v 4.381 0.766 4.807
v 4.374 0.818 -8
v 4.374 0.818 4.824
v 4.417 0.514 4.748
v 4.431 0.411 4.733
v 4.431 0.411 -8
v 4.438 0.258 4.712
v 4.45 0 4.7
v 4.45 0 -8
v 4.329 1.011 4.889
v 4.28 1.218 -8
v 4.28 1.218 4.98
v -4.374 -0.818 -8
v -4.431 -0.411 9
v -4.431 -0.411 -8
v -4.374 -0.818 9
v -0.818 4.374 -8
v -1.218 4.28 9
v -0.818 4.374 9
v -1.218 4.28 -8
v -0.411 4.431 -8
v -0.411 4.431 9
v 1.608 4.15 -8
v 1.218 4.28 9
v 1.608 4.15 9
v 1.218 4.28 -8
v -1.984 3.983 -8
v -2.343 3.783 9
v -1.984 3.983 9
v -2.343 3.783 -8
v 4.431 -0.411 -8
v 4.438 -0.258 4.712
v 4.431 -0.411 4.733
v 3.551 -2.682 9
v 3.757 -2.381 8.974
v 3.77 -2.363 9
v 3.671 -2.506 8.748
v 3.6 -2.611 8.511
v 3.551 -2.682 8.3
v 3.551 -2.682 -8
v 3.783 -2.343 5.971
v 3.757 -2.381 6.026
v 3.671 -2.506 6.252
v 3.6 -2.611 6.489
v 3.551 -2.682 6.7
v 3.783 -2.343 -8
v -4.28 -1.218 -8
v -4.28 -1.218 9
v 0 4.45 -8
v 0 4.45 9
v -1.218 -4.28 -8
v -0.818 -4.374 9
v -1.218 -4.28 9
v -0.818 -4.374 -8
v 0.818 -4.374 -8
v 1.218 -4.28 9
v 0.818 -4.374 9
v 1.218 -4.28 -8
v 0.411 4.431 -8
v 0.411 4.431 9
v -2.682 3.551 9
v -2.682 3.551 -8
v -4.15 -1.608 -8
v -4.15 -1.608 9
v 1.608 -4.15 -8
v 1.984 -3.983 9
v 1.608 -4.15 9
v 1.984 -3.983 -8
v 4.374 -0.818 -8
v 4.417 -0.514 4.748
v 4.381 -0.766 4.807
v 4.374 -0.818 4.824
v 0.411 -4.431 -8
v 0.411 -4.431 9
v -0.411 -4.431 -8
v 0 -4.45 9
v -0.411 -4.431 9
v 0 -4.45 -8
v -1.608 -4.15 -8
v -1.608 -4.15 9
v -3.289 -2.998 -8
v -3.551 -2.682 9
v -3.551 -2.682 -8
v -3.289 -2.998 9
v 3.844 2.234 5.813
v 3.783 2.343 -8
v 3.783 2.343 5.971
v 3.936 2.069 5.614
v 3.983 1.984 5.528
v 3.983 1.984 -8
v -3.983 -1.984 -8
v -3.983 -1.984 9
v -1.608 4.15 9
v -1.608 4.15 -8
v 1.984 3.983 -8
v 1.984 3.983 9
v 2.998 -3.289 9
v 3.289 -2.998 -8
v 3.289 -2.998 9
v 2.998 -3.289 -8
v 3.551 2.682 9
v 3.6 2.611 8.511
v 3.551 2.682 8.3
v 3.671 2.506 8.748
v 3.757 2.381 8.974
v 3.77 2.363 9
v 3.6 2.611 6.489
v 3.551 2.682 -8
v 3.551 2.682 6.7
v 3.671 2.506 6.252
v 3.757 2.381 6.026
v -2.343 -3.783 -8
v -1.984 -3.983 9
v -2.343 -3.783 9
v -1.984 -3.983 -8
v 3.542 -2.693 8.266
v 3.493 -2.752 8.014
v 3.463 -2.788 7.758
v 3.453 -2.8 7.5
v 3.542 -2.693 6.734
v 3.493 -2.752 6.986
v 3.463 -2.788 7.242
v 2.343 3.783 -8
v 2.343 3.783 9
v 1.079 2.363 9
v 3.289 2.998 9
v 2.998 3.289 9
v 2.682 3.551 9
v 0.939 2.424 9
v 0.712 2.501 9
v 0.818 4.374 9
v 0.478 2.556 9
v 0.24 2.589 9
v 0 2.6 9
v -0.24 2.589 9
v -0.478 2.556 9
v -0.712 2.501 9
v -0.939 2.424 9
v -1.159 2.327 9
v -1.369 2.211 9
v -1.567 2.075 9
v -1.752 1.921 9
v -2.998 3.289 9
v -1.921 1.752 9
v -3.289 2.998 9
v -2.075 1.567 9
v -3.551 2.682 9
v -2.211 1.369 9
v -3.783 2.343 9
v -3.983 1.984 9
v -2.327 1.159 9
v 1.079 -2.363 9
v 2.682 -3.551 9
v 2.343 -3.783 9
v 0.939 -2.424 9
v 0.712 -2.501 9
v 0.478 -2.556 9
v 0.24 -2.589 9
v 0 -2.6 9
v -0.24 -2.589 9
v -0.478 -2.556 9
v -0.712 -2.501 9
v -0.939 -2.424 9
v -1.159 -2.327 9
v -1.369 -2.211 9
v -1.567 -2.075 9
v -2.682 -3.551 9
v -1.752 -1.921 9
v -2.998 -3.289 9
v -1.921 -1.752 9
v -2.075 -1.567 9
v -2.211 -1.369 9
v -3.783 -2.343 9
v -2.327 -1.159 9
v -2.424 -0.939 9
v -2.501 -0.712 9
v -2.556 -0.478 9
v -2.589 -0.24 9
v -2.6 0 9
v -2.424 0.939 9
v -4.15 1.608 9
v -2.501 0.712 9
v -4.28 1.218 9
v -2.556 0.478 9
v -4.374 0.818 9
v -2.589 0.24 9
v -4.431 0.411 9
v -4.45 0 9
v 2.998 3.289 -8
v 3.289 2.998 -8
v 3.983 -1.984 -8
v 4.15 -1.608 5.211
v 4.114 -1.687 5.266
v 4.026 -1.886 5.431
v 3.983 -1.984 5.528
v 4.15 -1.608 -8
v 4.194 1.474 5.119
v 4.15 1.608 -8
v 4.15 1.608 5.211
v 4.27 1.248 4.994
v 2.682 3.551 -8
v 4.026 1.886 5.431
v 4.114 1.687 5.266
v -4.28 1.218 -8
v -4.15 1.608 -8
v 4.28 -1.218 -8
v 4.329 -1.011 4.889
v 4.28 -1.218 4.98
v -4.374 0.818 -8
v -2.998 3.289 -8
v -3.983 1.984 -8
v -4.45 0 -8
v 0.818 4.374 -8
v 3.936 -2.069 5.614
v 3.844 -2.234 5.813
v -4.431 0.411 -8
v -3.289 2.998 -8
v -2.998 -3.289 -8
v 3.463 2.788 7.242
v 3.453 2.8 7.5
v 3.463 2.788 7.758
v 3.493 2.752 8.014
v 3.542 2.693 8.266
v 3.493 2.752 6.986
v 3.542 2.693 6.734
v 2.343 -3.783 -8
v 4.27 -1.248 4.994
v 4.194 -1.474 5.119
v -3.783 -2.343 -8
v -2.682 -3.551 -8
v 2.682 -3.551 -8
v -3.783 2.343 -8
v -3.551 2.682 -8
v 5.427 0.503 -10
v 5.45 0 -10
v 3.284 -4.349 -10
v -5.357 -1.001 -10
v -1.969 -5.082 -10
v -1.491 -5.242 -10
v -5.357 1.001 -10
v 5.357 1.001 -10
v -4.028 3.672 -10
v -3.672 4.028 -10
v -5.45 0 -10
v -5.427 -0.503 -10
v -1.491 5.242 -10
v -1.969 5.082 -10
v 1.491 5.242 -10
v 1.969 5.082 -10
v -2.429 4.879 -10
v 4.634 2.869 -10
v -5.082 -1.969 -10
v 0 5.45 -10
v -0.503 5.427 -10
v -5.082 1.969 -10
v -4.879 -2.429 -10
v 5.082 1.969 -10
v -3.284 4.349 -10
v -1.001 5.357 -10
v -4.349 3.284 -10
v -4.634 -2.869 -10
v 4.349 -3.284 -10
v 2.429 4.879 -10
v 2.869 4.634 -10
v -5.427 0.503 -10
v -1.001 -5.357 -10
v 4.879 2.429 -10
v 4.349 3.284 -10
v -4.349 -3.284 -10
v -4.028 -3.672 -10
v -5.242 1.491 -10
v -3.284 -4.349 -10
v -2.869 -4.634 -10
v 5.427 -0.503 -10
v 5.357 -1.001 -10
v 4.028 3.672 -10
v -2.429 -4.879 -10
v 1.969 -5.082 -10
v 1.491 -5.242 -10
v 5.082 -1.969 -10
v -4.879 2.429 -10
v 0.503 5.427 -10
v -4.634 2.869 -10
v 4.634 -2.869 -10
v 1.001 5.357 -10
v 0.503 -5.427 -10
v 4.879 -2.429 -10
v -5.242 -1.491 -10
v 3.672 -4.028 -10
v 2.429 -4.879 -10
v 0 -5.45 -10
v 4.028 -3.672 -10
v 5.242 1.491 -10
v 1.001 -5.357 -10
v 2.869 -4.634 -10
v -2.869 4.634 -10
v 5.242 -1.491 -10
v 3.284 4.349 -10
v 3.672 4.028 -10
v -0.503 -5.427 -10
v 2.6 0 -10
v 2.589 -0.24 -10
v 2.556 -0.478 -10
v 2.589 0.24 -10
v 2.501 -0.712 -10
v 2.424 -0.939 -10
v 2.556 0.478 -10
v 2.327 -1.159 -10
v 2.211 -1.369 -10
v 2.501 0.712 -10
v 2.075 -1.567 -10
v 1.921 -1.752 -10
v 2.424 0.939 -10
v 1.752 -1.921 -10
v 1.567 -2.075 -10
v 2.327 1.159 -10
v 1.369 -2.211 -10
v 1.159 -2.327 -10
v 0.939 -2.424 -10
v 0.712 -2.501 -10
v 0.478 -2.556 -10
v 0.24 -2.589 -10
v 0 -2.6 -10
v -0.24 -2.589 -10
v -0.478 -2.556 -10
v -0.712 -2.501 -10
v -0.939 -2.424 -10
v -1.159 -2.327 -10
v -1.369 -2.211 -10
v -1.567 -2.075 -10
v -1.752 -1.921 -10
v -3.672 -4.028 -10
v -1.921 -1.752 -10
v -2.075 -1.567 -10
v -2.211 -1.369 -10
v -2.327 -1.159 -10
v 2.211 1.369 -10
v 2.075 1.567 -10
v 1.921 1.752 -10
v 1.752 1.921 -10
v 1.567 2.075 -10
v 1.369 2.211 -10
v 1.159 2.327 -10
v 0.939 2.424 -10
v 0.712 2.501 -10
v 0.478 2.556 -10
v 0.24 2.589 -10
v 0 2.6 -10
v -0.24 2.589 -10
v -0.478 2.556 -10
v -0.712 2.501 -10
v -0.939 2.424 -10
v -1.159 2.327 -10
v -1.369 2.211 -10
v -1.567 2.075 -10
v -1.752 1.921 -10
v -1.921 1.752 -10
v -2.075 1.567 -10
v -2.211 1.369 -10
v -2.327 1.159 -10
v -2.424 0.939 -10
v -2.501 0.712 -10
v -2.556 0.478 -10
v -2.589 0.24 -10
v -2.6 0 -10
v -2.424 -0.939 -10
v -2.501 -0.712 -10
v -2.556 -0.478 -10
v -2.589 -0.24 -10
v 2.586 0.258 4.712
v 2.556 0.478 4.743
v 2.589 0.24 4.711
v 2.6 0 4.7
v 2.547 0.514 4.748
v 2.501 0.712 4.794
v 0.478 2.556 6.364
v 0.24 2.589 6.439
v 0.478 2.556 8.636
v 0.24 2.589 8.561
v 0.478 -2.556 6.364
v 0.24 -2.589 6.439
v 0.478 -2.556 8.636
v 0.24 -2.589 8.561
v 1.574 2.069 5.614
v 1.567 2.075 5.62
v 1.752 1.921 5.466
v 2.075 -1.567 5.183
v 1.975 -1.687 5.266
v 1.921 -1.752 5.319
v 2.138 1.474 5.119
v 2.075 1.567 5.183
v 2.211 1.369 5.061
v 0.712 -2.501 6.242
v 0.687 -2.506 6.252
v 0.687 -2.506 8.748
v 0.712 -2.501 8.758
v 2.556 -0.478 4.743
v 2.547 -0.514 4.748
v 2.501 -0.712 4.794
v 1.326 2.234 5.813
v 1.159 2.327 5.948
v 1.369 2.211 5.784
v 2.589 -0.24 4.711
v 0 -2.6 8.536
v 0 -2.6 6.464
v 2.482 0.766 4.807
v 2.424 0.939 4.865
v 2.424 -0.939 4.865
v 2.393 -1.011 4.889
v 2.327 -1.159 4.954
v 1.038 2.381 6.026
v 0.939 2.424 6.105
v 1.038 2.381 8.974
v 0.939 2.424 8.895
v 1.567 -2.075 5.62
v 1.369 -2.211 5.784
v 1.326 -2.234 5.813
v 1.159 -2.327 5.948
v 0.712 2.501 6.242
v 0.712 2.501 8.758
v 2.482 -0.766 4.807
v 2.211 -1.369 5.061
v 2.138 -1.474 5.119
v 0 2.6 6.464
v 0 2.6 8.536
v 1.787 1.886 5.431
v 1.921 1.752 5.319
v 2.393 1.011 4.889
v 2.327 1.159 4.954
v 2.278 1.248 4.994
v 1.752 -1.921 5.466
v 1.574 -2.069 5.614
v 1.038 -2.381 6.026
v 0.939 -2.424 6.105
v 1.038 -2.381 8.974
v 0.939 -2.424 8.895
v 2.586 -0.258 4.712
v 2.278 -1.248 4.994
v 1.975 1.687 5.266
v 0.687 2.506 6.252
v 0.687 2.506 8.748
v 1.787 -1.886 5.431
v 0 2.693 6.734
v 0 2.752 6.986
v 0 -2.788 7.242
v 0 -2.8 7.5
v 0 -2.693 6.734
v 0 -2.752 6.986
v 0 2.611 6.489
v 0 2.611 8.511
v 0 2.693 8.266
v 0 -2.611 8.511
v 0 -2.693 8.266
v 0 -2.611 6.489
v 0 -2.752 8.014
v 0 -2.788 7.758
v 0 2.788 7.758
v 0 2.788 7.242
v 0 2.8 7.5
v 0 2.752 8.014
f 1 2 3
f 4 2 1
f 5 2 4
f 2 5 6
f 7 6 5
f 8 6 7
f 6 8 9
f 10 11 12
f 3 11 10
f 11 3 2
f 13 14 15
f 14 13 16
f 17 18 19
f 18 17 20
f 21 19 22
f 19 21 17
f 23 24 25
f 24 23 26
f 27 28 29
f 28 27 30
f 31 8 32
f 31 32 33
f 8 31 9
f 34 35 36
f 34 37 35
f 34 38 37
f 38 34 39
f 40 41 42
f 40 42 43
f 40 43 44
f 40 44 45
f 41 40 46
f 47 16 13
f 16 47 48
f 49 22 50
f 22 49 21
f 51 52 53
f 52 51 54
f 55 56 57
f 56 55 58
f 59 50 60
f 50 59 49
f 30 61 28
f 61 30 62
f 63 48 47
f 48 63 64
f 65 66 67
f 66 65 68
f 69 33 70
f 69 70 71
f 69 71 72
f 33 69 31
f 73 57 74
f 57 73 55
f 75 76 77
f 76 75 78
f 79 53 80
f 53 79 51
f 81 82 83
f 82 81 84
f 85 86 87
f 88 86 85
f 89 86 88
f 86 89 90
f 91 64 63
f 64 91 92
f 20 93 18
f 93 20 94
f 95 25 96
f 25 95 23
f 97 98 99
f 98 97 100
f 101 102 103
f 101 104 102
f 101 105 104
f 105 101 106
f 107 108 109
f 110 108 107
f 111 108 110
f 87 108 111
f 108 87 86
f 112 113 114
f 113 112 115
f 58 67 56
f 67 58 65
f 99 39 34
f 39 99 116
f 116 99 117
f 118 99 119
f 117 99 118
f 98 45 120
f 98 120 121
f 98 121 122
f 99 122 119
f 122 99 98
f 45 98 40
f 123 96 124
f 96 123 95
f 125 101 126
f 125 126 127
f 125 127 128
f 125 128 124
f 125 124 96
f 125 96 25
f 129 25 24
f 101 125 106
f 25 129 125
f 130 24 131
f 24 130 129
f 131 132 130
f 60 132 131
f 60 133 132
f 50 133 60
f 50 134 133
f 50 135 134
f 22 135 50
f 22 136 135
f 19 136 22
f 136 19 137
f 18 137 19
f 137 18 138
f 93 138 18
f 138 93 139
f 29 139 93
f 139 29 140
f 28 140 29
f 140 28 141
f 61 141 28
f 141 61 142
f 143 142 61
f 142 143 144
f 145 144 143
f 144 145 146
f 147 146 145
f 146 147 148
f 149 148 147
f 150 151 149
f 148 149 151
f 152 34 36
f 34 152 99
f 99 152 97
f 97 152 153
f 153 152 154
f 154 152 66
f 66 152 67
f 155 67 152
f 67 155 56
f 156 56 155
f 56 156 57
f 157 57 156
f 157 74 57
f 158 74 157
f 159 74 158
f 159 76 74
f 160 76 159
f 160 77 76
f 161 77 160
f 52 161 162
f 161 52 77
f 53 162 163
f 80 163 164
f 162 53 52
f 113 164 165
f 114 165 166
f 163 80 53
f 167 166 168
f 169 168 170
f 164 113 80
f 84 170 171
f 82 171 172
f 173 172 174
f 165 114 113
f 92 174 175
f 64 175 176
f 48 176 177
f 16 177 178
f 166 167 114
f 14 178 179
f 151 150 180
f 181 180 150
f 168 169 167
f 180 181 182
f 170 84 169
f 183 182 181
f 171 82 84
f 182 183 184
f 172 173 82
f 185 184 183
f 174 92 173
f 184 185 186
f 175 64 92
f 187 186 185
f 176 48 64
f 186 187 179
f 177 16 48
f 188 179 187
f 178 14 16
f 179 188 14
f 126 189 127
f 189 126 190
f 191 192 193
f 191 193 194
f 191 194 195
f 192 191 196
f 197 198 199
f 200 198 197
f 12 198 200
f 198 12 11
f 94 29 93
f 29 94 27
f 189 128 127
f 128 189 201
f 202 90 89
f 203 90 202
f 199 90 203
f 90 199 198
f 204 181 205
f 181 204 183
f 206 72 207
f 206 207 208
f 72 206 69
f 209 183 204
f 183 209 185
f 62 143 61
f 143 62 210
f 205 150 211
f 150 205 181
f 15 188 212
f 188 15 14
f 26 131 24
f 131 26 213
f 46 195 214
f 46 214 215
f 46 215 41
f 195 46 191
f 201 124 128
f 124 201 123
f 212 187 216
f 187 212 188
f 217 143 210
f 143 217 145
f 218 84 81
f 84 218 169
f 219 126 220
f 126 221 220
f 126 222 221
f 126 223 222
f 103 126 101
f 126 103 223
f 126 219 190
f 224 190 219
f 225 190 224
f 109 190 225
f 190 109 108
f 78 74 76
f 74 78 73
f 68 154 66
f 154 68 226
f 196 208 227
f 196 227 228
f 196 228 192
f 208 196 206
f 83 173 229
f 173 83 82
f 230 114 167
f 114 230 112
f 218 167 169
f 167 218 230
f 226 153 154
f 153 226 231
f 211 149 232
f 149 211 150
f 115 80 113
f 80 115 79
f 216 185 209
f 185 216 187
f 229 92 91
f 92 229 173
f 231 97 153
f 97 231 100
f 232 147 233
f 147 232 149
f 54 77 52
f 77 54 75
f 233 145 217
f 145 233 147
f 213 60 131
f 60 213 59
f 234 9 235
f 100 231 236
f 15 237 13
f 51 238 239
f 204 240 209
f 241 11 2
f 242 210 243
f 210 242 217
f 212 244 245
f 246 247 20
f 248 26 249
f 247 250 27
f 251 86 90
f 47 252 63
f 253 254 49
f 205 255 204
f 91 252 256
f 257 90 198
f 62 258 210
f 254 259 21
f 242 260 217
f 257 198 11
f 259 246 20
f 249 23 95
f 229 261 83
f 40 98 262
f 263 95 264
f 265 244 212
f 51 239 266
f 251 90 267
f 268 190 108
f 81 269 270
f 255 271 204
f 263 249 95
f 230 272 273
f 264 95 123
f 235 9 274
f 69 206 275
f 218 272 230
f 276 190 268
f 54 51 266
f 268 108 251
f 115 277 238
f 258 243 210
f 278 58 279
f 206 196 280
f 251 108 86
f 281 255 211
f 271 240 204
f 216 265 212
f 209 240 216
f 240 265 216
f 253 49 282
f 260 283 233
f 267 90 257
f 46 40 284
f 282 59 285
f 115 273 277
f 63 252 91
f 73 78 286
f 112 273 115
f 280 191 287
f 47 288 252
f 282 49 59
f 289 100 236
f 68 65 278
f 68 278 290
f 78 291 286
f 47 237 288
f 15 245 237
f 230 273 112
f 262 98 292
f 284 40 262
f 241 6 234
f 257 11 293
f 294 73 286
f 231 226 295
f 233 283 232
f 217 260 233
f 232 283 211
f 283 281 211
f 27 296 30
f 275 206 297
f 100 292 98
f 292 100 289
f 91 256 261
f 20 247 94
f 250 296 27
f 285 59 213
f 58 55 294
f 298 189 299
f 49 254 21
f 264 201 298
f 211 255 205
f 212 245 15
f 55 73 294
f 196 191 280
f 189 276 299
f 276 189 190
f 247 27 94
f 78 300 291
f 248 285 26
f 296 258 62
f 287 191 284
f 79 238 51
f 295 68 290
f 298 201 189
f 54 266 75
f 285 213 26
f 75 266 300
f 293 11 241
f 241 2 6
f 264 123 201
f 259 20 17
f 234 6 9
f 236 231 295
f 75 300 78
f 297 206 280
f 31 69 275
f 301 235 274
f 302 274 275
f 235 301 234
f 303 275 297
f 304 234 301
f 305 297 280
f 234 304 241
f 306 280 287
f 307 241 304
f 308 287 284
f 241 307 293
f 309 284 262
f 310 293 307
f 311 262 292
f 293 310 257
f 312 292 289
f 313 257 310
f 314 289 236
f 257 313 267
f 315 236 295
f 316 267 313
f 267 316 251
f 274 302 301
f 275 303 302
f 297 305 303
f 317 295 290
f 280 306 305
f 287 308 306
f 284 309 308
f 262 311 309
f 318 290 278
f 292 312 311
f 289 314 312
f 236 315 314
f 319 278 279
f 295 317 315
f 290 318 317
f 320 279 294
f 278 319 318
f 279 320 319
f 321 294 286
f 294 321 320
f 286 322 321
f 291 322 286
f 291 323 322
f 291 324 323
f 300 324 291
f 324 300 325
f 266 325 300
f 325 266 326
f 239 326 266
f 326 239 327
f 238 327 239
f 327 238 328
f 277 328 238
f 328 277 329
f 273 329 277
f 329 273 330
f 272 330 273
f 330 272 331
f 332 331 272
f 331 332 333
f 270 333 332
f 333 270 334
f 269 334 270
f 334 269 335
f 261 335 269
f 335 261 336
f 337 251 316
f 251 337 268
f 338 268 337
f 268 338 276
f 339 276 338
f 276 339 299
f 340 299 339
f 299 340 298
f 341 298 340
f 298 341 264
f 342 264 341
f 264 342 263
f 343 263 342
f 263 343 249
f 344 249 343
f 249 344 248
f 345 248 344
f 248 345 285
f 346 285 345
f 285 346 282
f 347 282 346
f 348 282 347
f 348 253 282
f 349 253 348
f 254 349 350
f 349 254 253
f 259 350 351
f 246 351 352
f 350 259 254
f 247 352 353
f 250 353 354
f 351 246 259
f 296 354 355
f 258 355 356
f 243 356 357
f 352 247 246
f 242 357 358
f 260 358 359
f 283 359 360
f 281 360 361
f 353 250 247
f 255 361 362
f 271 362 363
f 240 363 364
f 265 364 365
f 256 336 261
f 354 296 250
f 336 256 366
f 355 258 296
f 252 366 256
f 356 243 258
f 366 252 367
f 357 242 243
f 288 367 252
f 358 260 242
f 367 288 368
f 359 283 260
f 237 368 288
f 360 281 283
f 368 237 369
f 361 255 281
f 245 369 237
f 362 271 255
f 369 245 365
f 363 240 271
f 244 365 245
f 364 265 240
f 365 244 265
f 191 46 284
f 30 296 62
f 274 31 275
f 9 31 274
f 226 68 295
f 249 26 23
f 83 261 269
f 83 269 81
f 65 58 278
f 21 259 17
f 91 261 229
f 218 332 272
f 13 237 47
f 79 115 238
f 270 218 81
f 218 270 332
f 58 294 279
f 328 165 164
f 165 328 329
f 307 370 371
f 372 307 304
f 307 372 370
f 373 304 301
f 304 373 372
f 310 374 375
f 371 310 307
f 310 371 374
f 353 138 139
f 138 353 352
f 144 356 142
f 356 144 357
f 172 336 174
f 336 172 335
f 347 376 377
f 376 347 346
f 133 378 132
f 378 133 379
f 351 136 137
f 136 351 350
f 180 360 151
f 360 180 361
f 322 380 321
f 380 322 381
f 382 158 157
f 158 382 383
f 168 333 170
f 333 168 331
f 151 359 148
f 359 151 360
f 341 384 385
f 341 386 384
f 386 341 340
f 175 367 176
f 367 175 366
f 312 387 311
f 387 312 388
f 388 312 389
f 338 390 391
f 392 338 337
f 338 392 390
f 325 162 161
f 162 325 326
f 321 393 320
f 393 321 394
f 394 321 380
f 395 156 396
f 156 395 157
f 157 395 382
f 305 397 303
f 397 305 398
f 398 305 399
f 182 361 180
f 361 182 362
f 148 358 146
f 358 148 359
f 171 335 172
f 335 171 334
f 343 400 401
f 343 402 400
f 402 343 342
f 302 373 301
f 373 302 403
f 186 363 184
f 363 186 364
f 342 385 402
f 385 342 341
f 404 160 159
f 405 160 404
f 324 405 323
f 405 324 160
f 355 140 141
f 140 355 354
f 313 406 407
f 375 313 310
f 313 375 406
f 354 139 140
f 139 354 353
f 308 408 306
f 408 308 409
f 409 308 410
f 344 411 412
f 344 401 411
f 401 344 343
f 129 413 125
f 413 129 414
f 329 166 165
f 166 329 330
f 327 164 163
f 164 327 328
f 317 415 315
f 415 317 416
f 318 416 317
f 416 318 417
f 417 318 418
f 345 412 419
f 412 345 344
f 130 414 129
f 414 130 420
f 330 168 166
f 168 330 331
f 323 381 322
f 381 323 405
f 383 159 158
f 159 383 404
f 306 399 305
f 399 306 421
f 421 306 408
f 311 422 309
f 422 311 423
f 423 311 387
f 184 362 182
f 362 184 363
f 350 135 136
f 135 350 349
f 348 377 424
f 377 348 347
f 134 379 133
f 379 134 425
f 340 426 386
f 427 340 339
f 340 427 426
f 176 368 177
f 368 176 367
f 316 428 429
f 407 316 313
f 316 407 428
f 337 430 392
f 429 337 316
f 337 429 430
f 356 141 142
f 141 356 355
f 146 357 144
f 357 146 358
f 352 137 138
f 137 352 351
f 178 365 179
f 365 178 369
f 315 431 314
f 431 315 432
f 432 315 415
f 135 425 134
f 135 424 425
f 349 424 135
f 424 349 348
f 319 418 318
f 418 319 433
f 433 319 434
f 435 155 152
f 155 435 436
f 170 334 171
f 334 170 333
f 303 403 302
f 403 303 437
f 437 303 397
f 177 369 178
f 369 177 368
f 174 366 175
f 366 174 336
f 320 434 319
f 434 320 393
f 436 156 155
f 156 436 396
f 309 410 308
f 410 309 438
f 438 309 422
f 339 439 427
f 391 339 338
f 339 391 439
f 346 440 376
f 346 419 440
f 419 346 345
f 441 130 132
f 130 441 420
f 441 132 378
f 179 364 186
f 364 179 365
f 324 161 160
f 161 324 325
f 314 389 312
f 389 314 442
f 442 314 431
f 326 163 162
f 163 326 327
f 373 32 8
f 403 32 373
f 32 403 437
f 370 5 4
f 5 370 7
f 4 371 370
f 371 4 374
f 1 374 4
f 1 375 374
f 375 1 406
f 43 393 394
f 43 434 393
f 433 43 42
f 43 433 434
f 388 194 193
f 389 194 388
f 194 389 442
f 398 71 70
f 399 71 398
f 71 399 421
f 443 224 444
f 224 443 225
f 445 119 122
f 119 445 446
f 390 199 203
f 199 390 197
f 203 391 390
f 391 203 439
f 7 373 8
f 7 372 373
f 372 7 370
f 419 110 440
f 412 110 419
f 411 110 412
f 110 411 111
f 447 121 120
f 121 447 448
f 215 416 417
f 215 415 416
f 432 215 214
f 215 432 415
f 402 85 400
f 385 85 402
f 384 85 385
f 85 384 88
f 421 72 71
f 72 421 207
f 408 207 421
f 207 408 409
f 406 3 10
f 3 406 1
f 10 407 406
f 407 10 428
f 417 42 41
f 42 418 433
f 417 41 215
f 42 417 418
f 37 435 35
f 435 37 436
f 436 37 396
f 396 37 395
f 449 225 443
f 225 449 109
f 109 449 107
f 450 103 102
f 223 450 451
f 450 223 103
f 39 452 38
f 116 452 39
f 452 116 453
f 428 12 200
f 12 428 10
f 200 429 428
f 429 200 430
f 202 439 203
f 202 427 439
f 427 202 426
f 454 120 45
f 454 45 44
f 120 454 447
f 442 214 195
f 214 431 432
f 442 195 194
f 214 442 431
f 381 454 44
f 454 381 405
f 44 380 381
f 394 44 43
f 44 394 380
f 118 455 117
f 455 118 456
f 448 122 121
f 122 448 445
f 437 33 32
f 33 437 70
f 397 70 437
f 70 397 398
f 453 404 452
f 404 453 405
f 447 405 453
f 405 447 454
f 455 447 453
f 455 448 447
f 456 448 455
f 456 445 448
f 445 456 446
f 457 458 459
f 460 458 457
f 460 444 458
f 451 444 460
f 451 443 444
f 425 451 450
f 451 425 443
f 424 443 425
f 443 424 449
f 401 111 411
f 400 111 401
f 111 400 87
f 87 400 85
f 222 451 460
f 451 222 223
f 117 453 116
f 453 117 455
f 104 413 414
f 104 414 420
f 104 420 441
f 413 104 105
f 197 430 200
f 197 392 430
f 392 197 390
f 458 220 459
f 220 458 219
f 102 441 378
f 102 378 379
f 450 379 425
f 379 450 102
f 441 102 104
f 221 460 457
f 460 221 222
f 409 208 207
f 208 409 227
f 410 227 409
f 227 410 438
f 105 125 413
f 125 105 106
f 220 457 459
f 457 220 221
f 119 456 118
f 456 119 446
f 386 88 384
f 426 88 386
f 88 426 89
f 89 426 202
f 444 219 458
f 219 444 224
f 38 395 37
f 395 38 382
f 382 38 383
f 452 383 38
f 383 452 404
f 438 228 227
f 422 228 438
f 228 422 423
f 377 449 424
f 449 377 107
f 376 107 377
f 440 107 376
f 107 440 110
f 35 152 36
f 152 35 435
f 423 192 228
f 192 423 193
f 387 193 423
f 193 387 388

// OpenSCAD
//
// Dishwasher roller and bushing for dishtray rack
// 70's era General something something Electric 
//

washer_bushing_OD = 8.90;
washer_bushing_ID = 5.20;
wheel_radius_outer = 22.2;
wheel_radius_inner = 6;

//    translate([0,0,2.4/2])sphere(washer_bushing_OD/2.0,$fn=60);

module half_cylinder(high=1,rad=1,$fn=60,center=true){
    difference(){
      rotate([90,0,0])cylinder(h=high,r=rad,center=true);
      translate([0,0,-rad*5]) cube(rad*10,center=true);
    }
}

module half_sphere(radius=1,$fn=60){
    difference(){
      sphere(radius,center=true);
      translate([0,0,-radius*5]) cube(radius*10,center=true);
    }
}

module ring(){
  difference(){
  cylinder(h=19, r= wheel_radius_outer,$fn=68,center=true);
  cylinder(h=25, r= wheel_radius_inner,$fn=68,center=true);
  }
}

module shaping(){
union(){
translate([0,0,-6])cylinder(h=10,r1=wheel_radius_outer, r2=wheel_radius_inner, $fn=68,
center=true);
translate([0,0,10])cylinder(h=10, r= wheel_radius_outer*0.9, $fn=68, center=true);
}
}
// Bushing Part
difference(){
  difference(){
    union(){
      cylinder(h=18,r=washer_bushing_OD/2.0,$fn=68,center=true);
      translate([0,0,-9])cylinder(h=2, r1=washer_bushing_OD/2.0+1,r2=washer_bushing_OD/2.0,$fn=68,center=true);
    }
    cylinder(h=25,r=washer_bushing_ID/2.0,$fn=68,center=true);
  }
  translate([5,0,7.5])rotate([0,90,0])cylinder(h=10,r=2.80,$fn=68,center=true); 
}

// Wheel Part
//difference(){
//ring();
//shaping();
//}
// attempt at minkowski sum didn't go so well.  recompile?
//$fn=10;
//minkowski(){
//  sphere(r=10);
//  ring();
//}
